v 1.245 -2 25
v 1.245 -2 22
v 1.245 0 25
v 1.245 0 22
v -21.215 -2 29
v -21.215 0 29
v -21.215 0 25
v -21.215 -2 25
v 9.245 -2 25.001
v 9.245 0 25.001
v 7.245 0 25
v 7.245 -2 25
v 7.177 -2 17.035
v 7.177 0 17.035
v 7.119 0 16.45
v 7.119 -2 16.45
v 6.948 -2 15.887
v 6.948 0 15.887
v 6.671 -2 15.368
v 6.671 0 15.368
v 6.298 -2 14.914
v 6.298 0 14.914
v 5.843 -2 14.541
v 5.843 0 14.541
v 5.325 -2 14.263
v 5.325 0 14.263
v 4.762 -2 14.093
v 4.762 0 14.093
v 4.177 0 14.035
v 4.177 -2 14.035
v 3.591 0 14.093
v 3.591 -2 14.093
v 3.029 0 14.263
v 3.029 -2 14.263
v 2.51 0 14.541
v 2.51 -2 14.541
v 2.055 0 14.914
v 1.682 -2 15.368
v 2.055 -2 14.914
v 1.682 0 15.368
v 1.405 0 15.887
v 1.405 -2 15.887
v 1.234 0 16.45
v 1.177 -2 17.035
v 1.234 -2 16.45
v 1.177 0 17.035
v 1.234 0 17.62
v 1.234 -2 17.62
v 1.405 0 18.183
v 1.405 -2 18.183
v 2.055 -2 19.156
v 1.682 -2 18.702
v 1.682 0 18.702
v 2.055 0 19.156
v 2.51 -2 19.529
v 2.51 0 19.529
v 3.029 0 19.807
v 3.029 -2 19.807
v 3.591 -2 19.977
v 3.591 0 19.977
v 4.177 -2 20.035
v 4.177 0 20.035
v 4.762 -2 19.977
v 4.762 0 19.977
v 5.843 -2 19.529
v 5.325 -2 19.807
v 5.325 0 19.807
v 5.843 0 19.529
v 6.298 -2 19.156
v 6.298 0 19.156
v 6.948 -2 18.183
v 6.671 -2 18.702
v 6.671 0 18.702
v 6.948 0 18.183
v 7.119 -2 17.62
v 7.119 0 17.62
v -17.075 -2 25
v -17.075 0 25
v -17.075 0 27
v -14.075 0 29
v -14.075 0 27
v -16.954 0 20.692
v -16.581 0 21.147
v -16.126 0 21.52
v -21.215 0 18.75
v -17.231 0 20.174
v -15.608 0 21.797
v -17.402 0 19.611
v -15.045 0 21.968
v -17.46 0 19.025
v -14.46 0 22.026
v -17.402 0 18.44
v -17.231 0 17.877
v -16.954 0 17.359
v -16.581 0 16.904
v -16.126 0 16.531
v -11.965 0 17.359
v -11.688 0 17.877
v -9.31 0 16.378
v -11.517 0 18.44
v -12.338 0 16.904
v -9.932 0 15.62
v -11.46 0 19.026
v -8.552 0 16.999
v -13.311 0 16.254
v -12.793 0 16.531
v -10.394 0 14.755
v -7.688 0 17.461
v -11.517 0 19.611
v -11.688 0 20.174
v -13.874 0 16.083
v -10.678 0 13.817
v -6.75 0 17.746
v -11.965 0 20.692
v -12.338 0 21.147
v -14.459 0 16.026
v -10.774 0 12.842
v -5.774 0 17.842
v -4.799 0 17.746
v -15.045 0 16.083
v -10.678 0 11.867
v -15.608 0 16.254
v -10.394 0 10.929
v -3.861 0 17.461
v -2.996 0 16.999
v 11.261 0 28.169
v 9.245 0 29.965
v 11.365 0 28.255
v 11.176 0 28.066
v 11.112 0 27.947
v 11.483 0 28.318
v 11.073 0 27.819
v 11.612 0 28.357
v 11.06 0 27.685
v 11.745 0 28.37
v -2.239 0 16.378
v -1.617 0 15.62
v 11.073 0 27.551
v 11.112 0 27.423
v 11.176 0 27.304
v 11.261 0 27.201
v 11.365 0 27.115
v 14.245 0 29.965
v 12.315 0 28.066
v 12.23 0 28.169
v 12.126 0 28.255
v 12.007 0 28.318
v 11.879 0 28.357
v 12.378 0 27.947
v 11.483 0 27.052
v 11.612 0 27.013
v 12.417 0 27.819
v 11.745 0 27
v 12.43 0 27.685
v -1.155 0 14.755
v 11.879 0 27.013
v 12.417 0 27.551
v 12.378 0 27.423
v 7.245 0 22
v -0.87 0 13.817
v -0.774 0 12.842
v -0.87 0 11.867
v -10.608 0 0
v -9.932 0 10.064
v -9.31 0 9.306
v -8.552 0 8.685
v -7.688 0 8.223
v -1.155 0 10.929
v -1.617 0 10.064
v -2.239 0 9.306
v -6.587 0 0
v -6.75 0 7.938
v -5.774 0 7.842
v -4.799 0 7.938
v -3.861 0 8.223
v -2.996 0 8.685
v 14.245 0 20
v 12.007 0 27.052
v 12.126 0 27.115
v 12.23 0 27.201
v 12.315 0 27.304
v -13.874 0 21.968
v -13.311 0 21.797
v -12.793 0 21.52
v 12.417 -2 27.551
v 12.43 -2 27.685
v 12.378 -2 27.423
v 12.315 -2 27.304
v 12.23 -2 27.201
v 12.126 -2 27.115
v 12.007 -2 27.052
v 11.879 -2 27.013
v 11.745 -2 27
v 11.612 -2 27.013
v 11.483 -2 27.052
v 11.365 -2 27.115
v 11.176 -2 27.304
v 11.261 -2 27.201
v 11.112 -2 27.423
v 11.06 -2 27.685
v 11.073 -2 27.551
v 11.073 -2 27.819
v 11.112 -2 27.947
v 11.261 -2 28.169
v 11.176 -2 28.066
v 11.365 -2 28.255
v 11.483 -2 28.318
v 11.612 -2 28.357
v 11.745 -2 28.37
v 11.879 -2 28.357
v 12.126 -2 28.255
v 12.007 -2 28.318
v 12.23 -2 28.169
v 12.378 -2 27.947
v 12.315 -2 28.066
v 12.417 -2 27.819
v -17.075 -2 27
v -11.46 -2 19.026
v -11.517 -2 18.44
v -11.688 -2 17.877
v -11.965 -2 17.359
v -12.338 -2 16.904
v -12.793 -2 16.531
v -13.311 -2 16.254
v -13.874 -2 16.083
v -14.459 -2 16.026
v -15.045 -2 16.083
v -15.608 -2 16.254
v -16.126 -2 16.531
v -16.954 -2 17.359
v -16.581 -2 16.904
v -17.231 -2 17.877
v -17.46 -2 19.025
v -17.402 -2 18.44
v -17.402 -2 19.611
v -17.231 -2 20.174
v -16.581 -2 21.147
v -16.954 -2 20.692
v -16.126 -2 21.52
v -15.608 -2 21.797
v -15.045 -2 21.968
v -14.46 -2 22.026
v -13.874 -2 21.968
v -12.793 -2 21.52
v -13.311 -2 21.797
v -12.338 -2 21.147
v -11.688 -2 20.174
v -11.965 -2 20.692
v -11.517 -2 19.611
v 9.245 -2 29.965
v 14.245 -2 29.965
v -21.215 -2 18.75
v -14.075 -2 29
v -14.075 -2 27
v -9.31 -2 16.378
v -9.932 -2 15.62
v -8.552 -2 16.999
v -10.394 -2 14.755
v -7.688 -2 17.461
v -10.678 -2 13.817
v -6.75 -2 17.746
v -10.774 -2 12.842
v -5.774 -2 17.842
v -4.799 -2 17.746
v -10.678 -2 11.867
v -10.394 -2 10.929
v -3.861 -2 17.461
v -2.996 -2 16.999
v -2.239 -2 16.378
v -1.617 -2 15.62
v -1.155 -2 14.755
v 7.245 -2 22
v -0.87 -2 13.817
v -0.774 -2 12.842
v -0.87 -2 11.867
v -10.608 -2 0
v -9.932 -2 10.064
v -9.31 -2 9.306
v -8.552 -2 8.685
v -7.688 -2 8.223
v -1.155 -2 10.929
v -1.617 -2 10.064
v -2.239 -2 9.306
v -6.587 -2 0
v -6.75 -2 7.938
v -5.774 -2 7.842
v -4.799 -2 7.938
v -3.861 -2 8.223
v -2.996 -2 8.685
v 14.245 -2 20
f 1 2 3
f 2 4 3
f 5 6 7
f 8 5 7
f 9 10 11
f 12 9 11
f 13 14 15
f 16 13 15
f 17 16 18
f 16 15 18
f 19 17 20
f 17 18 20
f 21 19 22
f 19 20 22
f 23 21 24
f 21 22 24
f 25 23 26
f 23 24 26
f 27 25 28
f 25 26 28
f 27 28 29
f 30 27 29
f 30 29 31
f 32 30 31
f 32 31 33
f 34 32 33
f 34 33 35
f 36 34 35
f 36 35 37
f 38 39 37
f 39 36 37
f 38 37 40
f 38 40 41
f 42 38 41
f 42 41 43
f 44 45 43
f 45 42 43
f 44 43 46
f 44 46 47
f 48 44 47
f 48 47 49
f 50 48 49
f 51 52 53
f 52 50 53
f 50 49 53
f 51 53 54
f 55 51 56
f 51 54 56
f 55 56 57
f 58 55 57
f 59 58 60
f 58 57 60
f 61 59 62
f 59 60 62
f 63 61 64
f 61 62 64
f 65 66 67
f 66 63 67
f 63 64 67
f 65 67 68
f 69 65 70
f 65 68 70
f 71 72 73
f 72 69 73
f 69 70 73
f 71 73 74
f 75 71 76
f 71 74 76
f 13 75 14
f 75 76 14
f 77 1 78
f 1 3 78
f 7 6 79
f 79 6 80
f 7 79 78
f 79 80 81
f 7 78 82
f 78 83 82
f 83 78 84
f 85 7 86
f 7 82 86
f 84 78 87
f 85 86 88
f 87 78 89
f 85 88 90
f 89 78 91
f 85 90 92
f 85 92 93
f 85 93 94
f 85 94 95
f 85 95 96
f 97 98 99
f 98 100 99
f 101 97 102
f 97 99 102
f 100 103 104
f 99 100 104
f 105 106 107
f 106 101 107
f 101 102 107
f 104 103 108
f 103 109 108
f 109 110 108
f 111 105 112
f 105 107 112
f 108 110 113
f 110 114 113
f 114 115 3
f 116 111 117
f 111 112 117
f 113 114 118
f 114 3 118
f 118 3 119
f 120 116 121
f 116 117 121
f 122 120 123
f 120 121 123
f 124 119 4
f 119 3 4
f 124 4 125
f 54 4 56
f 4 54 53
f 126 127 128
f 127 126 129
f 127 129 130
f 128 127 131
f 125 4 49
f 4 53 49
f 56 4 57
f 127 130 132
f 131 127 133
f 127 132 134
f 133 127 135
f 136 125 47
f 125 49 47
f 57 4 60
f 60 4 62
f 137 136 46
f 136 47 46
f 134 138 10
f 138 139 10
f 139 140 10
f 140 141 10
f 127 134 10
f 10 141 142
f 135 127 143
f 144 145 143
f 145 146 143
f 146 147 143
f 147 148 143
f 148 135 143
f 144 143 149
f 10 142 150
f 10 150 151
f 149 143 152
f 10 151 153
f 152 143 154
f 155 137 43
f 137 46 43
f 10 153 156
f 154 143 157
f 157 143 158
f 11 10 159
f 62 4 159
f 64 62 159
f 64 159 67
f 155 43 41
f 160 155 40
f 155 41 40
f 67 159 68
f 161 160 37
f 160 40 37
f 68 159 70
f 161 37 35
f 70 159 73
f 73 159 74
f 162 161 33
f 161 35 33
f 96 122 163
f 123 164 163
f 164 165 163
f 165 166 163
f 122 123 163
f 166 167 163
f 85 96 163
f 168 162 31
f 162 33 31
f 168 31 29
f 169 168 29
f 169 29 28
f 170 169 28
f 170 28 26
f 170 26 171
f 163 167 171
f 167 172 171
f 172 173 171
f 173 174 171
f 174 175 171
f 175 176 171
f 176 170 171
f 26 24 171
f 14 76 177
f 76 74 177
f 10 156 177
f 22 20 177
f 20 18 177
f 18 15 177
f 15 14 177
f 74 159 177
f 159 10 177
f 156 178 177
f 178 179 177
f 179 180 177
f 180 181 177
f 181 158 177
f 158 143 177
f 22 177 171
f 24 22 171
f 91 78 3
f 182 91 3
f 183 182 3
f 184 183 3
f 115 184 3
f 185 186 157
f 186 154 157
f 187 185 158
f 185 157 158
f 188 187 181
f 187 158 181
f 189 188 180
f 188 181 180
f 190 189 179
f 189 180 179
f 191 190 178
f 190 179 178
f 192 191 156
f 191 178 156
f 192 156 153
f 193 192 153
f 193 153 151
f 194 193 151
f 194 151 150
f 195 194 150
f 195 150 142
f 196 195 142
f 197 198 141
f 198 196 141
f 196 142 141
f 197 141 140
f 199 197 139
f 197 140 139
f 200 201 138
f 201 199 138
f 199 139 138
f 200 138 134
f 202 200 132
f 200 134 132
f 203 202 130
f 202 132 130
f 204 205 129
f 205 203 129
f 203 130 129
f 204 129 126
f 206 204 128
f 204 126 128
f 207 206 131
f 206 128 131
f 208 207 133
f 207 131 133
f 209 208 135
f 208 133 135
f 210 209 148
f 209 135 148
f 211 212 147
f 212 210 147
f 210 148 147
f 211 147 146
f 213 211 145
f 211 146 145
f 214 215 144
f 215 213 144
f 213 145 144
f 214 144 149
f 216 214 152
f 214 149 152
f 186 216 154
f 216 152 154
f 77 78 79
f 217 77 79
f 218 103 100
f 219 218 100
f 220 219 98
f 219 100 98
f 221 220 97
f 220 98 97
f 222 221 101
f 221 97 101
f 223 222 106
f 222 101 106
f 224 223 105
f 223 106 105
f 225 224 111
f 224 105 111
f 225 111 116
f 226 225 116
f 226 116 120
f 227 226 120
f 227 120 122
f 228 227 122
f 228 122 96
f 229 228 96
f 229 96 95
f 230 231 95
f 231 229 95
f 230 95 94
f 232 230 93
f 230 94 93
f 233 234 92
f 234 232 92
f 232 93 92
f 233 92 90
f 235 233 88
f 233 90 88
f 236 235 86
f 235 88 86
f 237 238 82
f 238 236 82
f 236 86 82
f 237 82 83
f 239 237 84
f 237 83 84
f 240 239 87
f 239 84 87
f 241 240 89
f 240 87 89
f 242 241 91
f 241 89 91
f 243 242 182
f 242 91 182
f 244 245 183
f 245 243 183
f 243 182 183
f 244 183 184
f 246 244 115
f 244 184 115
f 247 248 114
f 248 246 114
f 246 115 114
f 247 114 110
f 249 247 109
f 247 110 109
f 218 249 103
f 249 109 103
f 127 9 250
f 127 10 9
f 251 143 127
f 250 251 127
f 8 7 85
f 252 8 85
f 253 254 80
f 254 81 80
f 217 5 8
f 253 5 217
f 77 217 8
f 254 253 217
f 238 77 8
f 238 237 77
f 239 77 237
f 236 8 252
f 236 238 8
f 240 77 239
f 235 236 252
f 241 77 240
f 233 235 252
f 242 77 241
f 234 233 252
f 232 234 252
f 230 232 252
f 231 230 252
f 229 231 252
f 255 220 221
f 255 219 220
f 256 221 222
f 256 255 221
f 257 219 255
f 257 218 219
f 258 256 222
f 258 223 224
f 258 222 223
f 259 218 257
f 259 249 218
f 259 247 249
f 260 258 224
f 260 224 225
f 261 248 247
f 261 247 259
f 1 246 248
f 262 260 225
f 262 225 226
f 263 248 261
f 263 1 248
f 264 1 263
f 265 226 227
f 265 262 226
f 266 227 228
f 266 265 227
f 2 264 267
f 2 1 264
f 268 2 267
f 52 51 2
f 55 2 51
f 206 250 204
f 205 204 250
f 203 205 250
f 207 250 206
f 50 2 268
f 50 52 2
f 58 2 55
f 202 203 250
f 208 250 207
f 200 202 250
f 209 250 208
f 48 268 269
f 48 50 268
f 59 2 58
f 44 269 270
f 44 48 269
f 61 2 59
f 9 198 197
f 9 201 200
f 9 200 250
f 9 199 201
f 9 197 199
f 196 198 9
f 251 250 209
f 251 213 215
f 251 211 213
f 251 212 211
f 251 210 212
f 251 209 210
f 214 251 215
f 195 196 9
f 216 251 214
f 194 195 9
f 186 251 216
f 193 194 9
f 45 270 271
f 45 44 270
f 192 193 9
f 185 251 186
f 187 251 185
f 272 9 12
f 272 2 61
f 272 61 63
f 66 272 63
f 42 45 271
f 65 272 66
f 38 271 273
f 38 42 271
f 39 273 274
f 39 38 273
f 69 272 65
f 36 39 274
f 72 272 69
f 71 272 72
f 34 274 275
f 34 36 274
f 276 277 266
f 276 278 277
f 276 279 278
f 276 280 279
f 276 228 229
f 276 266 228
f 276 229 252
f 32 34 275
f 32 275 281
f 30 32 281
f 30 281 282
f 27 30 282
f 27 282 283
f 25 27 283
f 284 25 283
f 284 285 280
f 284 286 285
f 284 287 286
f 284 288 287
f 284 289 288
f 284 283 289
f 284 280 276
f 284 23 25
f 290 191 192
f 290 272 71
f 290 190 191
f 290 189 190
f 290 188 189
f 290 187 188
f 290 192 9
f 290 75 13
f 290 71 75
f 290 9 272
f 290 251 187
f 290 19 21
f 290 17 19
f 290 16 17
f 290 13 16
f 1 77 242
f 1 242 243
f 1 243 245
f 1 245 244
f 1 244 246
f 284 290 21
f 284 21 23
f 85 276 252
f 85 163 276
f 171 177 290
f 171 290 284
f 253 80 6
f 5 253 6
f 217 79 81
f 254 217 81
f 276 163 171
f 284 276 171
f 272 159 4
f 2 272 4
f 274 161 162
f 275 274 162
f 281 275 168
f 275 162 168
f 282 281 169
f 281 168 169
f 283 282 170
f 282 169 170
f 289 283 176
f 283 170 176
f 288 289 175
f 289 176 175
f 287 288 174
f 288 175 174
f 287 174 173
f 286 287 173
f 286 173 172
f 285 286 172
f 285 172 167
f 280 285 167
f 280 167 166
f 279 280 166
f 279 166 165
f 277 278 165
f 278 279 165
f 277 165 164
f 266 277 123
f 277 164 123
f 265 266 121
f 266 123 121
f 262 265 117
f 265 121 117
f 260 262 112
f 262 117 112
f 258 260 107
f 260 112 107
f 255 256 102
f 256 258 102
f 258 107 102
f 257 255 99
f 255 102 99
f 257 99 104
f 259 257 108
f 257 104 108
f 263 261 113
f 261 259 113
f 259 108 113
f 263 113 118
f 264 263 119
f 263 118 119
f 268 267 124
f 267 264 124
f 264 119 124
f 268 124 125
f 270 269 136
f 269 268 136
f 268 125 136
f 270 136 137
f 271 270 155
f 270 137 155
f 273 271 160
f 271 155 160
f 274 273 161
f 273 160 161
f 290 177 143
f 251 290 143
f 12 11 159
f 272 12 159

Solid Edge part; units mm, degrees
sketch "Sketch1" plane through (0, 0, 0) normal (0, -1, 0) x (1, 0, 0)
  line L0 (7.245, 25) -> (7.245, 22)
  line L1 (7.245, 22) -> (1.245, 22)
  line L2 (1.245, 22) -> (1.245, 25)
  line L3 (1.245, 25) -> (-17.075, 25)
  line L4 (-17.075, 25) -> (-17.075, 27)
  line L5 (-17.075, 27) -> (-14.075, 27)
  line L6 (-14.075, 27) -> (-14.075, 29)
  line L7 (-14.075, 29) -> (-21.215, 29)
  line L8 (-21.215, 29) -> (-21.215, 25)
  line L9 (-21.215, 25) -> (-21.215, 18.75)
  line L10 (-10.6075, 0) -> (-21.215, 18.75)
  line L11 (-10.6075, 0) -> (-6.5872, 0)
  line L12 (14.2453, 20) -> (-6.5872, 0)
  line L13 (14.2453, 20) -> (14.2453, 29.9651)
  line L14 (14.2453, 29.9651) -> (9.2448, 29.9651)
  line L15 (9.2448, 25.0006) -> (9.2448, 29.9651)
  line L16 (9.2448, 25.0006) -> (7.245, 25)
  circle A0 centre (-5.7743, 12.842) radius 5
  circle A1 centre (-14.4595, 19.0255) radius 3
  circle A2 centre (4.1767, 17.035) radius 3
  circle A3 centre (11.7453, 27.685) radius 0.685
  dimension "D1" = 3
  dimension "D2" = 6
  dimension "D3" = 3
  dimension "D4" = 18.32
  dimension "D5" = 2
  dimension "D6" = 3
  dimension "D7" = 2
  dimension "D8" = 10
  dimension "D9" = 6
  dimension "D10" = 6
  dimension "D11" = 6
  dimension "D12" = 1.37
extrude "Protrusion1" add sketch "Sketch1" along normal blind 2
properties material "Acrylic, high impact grade"
